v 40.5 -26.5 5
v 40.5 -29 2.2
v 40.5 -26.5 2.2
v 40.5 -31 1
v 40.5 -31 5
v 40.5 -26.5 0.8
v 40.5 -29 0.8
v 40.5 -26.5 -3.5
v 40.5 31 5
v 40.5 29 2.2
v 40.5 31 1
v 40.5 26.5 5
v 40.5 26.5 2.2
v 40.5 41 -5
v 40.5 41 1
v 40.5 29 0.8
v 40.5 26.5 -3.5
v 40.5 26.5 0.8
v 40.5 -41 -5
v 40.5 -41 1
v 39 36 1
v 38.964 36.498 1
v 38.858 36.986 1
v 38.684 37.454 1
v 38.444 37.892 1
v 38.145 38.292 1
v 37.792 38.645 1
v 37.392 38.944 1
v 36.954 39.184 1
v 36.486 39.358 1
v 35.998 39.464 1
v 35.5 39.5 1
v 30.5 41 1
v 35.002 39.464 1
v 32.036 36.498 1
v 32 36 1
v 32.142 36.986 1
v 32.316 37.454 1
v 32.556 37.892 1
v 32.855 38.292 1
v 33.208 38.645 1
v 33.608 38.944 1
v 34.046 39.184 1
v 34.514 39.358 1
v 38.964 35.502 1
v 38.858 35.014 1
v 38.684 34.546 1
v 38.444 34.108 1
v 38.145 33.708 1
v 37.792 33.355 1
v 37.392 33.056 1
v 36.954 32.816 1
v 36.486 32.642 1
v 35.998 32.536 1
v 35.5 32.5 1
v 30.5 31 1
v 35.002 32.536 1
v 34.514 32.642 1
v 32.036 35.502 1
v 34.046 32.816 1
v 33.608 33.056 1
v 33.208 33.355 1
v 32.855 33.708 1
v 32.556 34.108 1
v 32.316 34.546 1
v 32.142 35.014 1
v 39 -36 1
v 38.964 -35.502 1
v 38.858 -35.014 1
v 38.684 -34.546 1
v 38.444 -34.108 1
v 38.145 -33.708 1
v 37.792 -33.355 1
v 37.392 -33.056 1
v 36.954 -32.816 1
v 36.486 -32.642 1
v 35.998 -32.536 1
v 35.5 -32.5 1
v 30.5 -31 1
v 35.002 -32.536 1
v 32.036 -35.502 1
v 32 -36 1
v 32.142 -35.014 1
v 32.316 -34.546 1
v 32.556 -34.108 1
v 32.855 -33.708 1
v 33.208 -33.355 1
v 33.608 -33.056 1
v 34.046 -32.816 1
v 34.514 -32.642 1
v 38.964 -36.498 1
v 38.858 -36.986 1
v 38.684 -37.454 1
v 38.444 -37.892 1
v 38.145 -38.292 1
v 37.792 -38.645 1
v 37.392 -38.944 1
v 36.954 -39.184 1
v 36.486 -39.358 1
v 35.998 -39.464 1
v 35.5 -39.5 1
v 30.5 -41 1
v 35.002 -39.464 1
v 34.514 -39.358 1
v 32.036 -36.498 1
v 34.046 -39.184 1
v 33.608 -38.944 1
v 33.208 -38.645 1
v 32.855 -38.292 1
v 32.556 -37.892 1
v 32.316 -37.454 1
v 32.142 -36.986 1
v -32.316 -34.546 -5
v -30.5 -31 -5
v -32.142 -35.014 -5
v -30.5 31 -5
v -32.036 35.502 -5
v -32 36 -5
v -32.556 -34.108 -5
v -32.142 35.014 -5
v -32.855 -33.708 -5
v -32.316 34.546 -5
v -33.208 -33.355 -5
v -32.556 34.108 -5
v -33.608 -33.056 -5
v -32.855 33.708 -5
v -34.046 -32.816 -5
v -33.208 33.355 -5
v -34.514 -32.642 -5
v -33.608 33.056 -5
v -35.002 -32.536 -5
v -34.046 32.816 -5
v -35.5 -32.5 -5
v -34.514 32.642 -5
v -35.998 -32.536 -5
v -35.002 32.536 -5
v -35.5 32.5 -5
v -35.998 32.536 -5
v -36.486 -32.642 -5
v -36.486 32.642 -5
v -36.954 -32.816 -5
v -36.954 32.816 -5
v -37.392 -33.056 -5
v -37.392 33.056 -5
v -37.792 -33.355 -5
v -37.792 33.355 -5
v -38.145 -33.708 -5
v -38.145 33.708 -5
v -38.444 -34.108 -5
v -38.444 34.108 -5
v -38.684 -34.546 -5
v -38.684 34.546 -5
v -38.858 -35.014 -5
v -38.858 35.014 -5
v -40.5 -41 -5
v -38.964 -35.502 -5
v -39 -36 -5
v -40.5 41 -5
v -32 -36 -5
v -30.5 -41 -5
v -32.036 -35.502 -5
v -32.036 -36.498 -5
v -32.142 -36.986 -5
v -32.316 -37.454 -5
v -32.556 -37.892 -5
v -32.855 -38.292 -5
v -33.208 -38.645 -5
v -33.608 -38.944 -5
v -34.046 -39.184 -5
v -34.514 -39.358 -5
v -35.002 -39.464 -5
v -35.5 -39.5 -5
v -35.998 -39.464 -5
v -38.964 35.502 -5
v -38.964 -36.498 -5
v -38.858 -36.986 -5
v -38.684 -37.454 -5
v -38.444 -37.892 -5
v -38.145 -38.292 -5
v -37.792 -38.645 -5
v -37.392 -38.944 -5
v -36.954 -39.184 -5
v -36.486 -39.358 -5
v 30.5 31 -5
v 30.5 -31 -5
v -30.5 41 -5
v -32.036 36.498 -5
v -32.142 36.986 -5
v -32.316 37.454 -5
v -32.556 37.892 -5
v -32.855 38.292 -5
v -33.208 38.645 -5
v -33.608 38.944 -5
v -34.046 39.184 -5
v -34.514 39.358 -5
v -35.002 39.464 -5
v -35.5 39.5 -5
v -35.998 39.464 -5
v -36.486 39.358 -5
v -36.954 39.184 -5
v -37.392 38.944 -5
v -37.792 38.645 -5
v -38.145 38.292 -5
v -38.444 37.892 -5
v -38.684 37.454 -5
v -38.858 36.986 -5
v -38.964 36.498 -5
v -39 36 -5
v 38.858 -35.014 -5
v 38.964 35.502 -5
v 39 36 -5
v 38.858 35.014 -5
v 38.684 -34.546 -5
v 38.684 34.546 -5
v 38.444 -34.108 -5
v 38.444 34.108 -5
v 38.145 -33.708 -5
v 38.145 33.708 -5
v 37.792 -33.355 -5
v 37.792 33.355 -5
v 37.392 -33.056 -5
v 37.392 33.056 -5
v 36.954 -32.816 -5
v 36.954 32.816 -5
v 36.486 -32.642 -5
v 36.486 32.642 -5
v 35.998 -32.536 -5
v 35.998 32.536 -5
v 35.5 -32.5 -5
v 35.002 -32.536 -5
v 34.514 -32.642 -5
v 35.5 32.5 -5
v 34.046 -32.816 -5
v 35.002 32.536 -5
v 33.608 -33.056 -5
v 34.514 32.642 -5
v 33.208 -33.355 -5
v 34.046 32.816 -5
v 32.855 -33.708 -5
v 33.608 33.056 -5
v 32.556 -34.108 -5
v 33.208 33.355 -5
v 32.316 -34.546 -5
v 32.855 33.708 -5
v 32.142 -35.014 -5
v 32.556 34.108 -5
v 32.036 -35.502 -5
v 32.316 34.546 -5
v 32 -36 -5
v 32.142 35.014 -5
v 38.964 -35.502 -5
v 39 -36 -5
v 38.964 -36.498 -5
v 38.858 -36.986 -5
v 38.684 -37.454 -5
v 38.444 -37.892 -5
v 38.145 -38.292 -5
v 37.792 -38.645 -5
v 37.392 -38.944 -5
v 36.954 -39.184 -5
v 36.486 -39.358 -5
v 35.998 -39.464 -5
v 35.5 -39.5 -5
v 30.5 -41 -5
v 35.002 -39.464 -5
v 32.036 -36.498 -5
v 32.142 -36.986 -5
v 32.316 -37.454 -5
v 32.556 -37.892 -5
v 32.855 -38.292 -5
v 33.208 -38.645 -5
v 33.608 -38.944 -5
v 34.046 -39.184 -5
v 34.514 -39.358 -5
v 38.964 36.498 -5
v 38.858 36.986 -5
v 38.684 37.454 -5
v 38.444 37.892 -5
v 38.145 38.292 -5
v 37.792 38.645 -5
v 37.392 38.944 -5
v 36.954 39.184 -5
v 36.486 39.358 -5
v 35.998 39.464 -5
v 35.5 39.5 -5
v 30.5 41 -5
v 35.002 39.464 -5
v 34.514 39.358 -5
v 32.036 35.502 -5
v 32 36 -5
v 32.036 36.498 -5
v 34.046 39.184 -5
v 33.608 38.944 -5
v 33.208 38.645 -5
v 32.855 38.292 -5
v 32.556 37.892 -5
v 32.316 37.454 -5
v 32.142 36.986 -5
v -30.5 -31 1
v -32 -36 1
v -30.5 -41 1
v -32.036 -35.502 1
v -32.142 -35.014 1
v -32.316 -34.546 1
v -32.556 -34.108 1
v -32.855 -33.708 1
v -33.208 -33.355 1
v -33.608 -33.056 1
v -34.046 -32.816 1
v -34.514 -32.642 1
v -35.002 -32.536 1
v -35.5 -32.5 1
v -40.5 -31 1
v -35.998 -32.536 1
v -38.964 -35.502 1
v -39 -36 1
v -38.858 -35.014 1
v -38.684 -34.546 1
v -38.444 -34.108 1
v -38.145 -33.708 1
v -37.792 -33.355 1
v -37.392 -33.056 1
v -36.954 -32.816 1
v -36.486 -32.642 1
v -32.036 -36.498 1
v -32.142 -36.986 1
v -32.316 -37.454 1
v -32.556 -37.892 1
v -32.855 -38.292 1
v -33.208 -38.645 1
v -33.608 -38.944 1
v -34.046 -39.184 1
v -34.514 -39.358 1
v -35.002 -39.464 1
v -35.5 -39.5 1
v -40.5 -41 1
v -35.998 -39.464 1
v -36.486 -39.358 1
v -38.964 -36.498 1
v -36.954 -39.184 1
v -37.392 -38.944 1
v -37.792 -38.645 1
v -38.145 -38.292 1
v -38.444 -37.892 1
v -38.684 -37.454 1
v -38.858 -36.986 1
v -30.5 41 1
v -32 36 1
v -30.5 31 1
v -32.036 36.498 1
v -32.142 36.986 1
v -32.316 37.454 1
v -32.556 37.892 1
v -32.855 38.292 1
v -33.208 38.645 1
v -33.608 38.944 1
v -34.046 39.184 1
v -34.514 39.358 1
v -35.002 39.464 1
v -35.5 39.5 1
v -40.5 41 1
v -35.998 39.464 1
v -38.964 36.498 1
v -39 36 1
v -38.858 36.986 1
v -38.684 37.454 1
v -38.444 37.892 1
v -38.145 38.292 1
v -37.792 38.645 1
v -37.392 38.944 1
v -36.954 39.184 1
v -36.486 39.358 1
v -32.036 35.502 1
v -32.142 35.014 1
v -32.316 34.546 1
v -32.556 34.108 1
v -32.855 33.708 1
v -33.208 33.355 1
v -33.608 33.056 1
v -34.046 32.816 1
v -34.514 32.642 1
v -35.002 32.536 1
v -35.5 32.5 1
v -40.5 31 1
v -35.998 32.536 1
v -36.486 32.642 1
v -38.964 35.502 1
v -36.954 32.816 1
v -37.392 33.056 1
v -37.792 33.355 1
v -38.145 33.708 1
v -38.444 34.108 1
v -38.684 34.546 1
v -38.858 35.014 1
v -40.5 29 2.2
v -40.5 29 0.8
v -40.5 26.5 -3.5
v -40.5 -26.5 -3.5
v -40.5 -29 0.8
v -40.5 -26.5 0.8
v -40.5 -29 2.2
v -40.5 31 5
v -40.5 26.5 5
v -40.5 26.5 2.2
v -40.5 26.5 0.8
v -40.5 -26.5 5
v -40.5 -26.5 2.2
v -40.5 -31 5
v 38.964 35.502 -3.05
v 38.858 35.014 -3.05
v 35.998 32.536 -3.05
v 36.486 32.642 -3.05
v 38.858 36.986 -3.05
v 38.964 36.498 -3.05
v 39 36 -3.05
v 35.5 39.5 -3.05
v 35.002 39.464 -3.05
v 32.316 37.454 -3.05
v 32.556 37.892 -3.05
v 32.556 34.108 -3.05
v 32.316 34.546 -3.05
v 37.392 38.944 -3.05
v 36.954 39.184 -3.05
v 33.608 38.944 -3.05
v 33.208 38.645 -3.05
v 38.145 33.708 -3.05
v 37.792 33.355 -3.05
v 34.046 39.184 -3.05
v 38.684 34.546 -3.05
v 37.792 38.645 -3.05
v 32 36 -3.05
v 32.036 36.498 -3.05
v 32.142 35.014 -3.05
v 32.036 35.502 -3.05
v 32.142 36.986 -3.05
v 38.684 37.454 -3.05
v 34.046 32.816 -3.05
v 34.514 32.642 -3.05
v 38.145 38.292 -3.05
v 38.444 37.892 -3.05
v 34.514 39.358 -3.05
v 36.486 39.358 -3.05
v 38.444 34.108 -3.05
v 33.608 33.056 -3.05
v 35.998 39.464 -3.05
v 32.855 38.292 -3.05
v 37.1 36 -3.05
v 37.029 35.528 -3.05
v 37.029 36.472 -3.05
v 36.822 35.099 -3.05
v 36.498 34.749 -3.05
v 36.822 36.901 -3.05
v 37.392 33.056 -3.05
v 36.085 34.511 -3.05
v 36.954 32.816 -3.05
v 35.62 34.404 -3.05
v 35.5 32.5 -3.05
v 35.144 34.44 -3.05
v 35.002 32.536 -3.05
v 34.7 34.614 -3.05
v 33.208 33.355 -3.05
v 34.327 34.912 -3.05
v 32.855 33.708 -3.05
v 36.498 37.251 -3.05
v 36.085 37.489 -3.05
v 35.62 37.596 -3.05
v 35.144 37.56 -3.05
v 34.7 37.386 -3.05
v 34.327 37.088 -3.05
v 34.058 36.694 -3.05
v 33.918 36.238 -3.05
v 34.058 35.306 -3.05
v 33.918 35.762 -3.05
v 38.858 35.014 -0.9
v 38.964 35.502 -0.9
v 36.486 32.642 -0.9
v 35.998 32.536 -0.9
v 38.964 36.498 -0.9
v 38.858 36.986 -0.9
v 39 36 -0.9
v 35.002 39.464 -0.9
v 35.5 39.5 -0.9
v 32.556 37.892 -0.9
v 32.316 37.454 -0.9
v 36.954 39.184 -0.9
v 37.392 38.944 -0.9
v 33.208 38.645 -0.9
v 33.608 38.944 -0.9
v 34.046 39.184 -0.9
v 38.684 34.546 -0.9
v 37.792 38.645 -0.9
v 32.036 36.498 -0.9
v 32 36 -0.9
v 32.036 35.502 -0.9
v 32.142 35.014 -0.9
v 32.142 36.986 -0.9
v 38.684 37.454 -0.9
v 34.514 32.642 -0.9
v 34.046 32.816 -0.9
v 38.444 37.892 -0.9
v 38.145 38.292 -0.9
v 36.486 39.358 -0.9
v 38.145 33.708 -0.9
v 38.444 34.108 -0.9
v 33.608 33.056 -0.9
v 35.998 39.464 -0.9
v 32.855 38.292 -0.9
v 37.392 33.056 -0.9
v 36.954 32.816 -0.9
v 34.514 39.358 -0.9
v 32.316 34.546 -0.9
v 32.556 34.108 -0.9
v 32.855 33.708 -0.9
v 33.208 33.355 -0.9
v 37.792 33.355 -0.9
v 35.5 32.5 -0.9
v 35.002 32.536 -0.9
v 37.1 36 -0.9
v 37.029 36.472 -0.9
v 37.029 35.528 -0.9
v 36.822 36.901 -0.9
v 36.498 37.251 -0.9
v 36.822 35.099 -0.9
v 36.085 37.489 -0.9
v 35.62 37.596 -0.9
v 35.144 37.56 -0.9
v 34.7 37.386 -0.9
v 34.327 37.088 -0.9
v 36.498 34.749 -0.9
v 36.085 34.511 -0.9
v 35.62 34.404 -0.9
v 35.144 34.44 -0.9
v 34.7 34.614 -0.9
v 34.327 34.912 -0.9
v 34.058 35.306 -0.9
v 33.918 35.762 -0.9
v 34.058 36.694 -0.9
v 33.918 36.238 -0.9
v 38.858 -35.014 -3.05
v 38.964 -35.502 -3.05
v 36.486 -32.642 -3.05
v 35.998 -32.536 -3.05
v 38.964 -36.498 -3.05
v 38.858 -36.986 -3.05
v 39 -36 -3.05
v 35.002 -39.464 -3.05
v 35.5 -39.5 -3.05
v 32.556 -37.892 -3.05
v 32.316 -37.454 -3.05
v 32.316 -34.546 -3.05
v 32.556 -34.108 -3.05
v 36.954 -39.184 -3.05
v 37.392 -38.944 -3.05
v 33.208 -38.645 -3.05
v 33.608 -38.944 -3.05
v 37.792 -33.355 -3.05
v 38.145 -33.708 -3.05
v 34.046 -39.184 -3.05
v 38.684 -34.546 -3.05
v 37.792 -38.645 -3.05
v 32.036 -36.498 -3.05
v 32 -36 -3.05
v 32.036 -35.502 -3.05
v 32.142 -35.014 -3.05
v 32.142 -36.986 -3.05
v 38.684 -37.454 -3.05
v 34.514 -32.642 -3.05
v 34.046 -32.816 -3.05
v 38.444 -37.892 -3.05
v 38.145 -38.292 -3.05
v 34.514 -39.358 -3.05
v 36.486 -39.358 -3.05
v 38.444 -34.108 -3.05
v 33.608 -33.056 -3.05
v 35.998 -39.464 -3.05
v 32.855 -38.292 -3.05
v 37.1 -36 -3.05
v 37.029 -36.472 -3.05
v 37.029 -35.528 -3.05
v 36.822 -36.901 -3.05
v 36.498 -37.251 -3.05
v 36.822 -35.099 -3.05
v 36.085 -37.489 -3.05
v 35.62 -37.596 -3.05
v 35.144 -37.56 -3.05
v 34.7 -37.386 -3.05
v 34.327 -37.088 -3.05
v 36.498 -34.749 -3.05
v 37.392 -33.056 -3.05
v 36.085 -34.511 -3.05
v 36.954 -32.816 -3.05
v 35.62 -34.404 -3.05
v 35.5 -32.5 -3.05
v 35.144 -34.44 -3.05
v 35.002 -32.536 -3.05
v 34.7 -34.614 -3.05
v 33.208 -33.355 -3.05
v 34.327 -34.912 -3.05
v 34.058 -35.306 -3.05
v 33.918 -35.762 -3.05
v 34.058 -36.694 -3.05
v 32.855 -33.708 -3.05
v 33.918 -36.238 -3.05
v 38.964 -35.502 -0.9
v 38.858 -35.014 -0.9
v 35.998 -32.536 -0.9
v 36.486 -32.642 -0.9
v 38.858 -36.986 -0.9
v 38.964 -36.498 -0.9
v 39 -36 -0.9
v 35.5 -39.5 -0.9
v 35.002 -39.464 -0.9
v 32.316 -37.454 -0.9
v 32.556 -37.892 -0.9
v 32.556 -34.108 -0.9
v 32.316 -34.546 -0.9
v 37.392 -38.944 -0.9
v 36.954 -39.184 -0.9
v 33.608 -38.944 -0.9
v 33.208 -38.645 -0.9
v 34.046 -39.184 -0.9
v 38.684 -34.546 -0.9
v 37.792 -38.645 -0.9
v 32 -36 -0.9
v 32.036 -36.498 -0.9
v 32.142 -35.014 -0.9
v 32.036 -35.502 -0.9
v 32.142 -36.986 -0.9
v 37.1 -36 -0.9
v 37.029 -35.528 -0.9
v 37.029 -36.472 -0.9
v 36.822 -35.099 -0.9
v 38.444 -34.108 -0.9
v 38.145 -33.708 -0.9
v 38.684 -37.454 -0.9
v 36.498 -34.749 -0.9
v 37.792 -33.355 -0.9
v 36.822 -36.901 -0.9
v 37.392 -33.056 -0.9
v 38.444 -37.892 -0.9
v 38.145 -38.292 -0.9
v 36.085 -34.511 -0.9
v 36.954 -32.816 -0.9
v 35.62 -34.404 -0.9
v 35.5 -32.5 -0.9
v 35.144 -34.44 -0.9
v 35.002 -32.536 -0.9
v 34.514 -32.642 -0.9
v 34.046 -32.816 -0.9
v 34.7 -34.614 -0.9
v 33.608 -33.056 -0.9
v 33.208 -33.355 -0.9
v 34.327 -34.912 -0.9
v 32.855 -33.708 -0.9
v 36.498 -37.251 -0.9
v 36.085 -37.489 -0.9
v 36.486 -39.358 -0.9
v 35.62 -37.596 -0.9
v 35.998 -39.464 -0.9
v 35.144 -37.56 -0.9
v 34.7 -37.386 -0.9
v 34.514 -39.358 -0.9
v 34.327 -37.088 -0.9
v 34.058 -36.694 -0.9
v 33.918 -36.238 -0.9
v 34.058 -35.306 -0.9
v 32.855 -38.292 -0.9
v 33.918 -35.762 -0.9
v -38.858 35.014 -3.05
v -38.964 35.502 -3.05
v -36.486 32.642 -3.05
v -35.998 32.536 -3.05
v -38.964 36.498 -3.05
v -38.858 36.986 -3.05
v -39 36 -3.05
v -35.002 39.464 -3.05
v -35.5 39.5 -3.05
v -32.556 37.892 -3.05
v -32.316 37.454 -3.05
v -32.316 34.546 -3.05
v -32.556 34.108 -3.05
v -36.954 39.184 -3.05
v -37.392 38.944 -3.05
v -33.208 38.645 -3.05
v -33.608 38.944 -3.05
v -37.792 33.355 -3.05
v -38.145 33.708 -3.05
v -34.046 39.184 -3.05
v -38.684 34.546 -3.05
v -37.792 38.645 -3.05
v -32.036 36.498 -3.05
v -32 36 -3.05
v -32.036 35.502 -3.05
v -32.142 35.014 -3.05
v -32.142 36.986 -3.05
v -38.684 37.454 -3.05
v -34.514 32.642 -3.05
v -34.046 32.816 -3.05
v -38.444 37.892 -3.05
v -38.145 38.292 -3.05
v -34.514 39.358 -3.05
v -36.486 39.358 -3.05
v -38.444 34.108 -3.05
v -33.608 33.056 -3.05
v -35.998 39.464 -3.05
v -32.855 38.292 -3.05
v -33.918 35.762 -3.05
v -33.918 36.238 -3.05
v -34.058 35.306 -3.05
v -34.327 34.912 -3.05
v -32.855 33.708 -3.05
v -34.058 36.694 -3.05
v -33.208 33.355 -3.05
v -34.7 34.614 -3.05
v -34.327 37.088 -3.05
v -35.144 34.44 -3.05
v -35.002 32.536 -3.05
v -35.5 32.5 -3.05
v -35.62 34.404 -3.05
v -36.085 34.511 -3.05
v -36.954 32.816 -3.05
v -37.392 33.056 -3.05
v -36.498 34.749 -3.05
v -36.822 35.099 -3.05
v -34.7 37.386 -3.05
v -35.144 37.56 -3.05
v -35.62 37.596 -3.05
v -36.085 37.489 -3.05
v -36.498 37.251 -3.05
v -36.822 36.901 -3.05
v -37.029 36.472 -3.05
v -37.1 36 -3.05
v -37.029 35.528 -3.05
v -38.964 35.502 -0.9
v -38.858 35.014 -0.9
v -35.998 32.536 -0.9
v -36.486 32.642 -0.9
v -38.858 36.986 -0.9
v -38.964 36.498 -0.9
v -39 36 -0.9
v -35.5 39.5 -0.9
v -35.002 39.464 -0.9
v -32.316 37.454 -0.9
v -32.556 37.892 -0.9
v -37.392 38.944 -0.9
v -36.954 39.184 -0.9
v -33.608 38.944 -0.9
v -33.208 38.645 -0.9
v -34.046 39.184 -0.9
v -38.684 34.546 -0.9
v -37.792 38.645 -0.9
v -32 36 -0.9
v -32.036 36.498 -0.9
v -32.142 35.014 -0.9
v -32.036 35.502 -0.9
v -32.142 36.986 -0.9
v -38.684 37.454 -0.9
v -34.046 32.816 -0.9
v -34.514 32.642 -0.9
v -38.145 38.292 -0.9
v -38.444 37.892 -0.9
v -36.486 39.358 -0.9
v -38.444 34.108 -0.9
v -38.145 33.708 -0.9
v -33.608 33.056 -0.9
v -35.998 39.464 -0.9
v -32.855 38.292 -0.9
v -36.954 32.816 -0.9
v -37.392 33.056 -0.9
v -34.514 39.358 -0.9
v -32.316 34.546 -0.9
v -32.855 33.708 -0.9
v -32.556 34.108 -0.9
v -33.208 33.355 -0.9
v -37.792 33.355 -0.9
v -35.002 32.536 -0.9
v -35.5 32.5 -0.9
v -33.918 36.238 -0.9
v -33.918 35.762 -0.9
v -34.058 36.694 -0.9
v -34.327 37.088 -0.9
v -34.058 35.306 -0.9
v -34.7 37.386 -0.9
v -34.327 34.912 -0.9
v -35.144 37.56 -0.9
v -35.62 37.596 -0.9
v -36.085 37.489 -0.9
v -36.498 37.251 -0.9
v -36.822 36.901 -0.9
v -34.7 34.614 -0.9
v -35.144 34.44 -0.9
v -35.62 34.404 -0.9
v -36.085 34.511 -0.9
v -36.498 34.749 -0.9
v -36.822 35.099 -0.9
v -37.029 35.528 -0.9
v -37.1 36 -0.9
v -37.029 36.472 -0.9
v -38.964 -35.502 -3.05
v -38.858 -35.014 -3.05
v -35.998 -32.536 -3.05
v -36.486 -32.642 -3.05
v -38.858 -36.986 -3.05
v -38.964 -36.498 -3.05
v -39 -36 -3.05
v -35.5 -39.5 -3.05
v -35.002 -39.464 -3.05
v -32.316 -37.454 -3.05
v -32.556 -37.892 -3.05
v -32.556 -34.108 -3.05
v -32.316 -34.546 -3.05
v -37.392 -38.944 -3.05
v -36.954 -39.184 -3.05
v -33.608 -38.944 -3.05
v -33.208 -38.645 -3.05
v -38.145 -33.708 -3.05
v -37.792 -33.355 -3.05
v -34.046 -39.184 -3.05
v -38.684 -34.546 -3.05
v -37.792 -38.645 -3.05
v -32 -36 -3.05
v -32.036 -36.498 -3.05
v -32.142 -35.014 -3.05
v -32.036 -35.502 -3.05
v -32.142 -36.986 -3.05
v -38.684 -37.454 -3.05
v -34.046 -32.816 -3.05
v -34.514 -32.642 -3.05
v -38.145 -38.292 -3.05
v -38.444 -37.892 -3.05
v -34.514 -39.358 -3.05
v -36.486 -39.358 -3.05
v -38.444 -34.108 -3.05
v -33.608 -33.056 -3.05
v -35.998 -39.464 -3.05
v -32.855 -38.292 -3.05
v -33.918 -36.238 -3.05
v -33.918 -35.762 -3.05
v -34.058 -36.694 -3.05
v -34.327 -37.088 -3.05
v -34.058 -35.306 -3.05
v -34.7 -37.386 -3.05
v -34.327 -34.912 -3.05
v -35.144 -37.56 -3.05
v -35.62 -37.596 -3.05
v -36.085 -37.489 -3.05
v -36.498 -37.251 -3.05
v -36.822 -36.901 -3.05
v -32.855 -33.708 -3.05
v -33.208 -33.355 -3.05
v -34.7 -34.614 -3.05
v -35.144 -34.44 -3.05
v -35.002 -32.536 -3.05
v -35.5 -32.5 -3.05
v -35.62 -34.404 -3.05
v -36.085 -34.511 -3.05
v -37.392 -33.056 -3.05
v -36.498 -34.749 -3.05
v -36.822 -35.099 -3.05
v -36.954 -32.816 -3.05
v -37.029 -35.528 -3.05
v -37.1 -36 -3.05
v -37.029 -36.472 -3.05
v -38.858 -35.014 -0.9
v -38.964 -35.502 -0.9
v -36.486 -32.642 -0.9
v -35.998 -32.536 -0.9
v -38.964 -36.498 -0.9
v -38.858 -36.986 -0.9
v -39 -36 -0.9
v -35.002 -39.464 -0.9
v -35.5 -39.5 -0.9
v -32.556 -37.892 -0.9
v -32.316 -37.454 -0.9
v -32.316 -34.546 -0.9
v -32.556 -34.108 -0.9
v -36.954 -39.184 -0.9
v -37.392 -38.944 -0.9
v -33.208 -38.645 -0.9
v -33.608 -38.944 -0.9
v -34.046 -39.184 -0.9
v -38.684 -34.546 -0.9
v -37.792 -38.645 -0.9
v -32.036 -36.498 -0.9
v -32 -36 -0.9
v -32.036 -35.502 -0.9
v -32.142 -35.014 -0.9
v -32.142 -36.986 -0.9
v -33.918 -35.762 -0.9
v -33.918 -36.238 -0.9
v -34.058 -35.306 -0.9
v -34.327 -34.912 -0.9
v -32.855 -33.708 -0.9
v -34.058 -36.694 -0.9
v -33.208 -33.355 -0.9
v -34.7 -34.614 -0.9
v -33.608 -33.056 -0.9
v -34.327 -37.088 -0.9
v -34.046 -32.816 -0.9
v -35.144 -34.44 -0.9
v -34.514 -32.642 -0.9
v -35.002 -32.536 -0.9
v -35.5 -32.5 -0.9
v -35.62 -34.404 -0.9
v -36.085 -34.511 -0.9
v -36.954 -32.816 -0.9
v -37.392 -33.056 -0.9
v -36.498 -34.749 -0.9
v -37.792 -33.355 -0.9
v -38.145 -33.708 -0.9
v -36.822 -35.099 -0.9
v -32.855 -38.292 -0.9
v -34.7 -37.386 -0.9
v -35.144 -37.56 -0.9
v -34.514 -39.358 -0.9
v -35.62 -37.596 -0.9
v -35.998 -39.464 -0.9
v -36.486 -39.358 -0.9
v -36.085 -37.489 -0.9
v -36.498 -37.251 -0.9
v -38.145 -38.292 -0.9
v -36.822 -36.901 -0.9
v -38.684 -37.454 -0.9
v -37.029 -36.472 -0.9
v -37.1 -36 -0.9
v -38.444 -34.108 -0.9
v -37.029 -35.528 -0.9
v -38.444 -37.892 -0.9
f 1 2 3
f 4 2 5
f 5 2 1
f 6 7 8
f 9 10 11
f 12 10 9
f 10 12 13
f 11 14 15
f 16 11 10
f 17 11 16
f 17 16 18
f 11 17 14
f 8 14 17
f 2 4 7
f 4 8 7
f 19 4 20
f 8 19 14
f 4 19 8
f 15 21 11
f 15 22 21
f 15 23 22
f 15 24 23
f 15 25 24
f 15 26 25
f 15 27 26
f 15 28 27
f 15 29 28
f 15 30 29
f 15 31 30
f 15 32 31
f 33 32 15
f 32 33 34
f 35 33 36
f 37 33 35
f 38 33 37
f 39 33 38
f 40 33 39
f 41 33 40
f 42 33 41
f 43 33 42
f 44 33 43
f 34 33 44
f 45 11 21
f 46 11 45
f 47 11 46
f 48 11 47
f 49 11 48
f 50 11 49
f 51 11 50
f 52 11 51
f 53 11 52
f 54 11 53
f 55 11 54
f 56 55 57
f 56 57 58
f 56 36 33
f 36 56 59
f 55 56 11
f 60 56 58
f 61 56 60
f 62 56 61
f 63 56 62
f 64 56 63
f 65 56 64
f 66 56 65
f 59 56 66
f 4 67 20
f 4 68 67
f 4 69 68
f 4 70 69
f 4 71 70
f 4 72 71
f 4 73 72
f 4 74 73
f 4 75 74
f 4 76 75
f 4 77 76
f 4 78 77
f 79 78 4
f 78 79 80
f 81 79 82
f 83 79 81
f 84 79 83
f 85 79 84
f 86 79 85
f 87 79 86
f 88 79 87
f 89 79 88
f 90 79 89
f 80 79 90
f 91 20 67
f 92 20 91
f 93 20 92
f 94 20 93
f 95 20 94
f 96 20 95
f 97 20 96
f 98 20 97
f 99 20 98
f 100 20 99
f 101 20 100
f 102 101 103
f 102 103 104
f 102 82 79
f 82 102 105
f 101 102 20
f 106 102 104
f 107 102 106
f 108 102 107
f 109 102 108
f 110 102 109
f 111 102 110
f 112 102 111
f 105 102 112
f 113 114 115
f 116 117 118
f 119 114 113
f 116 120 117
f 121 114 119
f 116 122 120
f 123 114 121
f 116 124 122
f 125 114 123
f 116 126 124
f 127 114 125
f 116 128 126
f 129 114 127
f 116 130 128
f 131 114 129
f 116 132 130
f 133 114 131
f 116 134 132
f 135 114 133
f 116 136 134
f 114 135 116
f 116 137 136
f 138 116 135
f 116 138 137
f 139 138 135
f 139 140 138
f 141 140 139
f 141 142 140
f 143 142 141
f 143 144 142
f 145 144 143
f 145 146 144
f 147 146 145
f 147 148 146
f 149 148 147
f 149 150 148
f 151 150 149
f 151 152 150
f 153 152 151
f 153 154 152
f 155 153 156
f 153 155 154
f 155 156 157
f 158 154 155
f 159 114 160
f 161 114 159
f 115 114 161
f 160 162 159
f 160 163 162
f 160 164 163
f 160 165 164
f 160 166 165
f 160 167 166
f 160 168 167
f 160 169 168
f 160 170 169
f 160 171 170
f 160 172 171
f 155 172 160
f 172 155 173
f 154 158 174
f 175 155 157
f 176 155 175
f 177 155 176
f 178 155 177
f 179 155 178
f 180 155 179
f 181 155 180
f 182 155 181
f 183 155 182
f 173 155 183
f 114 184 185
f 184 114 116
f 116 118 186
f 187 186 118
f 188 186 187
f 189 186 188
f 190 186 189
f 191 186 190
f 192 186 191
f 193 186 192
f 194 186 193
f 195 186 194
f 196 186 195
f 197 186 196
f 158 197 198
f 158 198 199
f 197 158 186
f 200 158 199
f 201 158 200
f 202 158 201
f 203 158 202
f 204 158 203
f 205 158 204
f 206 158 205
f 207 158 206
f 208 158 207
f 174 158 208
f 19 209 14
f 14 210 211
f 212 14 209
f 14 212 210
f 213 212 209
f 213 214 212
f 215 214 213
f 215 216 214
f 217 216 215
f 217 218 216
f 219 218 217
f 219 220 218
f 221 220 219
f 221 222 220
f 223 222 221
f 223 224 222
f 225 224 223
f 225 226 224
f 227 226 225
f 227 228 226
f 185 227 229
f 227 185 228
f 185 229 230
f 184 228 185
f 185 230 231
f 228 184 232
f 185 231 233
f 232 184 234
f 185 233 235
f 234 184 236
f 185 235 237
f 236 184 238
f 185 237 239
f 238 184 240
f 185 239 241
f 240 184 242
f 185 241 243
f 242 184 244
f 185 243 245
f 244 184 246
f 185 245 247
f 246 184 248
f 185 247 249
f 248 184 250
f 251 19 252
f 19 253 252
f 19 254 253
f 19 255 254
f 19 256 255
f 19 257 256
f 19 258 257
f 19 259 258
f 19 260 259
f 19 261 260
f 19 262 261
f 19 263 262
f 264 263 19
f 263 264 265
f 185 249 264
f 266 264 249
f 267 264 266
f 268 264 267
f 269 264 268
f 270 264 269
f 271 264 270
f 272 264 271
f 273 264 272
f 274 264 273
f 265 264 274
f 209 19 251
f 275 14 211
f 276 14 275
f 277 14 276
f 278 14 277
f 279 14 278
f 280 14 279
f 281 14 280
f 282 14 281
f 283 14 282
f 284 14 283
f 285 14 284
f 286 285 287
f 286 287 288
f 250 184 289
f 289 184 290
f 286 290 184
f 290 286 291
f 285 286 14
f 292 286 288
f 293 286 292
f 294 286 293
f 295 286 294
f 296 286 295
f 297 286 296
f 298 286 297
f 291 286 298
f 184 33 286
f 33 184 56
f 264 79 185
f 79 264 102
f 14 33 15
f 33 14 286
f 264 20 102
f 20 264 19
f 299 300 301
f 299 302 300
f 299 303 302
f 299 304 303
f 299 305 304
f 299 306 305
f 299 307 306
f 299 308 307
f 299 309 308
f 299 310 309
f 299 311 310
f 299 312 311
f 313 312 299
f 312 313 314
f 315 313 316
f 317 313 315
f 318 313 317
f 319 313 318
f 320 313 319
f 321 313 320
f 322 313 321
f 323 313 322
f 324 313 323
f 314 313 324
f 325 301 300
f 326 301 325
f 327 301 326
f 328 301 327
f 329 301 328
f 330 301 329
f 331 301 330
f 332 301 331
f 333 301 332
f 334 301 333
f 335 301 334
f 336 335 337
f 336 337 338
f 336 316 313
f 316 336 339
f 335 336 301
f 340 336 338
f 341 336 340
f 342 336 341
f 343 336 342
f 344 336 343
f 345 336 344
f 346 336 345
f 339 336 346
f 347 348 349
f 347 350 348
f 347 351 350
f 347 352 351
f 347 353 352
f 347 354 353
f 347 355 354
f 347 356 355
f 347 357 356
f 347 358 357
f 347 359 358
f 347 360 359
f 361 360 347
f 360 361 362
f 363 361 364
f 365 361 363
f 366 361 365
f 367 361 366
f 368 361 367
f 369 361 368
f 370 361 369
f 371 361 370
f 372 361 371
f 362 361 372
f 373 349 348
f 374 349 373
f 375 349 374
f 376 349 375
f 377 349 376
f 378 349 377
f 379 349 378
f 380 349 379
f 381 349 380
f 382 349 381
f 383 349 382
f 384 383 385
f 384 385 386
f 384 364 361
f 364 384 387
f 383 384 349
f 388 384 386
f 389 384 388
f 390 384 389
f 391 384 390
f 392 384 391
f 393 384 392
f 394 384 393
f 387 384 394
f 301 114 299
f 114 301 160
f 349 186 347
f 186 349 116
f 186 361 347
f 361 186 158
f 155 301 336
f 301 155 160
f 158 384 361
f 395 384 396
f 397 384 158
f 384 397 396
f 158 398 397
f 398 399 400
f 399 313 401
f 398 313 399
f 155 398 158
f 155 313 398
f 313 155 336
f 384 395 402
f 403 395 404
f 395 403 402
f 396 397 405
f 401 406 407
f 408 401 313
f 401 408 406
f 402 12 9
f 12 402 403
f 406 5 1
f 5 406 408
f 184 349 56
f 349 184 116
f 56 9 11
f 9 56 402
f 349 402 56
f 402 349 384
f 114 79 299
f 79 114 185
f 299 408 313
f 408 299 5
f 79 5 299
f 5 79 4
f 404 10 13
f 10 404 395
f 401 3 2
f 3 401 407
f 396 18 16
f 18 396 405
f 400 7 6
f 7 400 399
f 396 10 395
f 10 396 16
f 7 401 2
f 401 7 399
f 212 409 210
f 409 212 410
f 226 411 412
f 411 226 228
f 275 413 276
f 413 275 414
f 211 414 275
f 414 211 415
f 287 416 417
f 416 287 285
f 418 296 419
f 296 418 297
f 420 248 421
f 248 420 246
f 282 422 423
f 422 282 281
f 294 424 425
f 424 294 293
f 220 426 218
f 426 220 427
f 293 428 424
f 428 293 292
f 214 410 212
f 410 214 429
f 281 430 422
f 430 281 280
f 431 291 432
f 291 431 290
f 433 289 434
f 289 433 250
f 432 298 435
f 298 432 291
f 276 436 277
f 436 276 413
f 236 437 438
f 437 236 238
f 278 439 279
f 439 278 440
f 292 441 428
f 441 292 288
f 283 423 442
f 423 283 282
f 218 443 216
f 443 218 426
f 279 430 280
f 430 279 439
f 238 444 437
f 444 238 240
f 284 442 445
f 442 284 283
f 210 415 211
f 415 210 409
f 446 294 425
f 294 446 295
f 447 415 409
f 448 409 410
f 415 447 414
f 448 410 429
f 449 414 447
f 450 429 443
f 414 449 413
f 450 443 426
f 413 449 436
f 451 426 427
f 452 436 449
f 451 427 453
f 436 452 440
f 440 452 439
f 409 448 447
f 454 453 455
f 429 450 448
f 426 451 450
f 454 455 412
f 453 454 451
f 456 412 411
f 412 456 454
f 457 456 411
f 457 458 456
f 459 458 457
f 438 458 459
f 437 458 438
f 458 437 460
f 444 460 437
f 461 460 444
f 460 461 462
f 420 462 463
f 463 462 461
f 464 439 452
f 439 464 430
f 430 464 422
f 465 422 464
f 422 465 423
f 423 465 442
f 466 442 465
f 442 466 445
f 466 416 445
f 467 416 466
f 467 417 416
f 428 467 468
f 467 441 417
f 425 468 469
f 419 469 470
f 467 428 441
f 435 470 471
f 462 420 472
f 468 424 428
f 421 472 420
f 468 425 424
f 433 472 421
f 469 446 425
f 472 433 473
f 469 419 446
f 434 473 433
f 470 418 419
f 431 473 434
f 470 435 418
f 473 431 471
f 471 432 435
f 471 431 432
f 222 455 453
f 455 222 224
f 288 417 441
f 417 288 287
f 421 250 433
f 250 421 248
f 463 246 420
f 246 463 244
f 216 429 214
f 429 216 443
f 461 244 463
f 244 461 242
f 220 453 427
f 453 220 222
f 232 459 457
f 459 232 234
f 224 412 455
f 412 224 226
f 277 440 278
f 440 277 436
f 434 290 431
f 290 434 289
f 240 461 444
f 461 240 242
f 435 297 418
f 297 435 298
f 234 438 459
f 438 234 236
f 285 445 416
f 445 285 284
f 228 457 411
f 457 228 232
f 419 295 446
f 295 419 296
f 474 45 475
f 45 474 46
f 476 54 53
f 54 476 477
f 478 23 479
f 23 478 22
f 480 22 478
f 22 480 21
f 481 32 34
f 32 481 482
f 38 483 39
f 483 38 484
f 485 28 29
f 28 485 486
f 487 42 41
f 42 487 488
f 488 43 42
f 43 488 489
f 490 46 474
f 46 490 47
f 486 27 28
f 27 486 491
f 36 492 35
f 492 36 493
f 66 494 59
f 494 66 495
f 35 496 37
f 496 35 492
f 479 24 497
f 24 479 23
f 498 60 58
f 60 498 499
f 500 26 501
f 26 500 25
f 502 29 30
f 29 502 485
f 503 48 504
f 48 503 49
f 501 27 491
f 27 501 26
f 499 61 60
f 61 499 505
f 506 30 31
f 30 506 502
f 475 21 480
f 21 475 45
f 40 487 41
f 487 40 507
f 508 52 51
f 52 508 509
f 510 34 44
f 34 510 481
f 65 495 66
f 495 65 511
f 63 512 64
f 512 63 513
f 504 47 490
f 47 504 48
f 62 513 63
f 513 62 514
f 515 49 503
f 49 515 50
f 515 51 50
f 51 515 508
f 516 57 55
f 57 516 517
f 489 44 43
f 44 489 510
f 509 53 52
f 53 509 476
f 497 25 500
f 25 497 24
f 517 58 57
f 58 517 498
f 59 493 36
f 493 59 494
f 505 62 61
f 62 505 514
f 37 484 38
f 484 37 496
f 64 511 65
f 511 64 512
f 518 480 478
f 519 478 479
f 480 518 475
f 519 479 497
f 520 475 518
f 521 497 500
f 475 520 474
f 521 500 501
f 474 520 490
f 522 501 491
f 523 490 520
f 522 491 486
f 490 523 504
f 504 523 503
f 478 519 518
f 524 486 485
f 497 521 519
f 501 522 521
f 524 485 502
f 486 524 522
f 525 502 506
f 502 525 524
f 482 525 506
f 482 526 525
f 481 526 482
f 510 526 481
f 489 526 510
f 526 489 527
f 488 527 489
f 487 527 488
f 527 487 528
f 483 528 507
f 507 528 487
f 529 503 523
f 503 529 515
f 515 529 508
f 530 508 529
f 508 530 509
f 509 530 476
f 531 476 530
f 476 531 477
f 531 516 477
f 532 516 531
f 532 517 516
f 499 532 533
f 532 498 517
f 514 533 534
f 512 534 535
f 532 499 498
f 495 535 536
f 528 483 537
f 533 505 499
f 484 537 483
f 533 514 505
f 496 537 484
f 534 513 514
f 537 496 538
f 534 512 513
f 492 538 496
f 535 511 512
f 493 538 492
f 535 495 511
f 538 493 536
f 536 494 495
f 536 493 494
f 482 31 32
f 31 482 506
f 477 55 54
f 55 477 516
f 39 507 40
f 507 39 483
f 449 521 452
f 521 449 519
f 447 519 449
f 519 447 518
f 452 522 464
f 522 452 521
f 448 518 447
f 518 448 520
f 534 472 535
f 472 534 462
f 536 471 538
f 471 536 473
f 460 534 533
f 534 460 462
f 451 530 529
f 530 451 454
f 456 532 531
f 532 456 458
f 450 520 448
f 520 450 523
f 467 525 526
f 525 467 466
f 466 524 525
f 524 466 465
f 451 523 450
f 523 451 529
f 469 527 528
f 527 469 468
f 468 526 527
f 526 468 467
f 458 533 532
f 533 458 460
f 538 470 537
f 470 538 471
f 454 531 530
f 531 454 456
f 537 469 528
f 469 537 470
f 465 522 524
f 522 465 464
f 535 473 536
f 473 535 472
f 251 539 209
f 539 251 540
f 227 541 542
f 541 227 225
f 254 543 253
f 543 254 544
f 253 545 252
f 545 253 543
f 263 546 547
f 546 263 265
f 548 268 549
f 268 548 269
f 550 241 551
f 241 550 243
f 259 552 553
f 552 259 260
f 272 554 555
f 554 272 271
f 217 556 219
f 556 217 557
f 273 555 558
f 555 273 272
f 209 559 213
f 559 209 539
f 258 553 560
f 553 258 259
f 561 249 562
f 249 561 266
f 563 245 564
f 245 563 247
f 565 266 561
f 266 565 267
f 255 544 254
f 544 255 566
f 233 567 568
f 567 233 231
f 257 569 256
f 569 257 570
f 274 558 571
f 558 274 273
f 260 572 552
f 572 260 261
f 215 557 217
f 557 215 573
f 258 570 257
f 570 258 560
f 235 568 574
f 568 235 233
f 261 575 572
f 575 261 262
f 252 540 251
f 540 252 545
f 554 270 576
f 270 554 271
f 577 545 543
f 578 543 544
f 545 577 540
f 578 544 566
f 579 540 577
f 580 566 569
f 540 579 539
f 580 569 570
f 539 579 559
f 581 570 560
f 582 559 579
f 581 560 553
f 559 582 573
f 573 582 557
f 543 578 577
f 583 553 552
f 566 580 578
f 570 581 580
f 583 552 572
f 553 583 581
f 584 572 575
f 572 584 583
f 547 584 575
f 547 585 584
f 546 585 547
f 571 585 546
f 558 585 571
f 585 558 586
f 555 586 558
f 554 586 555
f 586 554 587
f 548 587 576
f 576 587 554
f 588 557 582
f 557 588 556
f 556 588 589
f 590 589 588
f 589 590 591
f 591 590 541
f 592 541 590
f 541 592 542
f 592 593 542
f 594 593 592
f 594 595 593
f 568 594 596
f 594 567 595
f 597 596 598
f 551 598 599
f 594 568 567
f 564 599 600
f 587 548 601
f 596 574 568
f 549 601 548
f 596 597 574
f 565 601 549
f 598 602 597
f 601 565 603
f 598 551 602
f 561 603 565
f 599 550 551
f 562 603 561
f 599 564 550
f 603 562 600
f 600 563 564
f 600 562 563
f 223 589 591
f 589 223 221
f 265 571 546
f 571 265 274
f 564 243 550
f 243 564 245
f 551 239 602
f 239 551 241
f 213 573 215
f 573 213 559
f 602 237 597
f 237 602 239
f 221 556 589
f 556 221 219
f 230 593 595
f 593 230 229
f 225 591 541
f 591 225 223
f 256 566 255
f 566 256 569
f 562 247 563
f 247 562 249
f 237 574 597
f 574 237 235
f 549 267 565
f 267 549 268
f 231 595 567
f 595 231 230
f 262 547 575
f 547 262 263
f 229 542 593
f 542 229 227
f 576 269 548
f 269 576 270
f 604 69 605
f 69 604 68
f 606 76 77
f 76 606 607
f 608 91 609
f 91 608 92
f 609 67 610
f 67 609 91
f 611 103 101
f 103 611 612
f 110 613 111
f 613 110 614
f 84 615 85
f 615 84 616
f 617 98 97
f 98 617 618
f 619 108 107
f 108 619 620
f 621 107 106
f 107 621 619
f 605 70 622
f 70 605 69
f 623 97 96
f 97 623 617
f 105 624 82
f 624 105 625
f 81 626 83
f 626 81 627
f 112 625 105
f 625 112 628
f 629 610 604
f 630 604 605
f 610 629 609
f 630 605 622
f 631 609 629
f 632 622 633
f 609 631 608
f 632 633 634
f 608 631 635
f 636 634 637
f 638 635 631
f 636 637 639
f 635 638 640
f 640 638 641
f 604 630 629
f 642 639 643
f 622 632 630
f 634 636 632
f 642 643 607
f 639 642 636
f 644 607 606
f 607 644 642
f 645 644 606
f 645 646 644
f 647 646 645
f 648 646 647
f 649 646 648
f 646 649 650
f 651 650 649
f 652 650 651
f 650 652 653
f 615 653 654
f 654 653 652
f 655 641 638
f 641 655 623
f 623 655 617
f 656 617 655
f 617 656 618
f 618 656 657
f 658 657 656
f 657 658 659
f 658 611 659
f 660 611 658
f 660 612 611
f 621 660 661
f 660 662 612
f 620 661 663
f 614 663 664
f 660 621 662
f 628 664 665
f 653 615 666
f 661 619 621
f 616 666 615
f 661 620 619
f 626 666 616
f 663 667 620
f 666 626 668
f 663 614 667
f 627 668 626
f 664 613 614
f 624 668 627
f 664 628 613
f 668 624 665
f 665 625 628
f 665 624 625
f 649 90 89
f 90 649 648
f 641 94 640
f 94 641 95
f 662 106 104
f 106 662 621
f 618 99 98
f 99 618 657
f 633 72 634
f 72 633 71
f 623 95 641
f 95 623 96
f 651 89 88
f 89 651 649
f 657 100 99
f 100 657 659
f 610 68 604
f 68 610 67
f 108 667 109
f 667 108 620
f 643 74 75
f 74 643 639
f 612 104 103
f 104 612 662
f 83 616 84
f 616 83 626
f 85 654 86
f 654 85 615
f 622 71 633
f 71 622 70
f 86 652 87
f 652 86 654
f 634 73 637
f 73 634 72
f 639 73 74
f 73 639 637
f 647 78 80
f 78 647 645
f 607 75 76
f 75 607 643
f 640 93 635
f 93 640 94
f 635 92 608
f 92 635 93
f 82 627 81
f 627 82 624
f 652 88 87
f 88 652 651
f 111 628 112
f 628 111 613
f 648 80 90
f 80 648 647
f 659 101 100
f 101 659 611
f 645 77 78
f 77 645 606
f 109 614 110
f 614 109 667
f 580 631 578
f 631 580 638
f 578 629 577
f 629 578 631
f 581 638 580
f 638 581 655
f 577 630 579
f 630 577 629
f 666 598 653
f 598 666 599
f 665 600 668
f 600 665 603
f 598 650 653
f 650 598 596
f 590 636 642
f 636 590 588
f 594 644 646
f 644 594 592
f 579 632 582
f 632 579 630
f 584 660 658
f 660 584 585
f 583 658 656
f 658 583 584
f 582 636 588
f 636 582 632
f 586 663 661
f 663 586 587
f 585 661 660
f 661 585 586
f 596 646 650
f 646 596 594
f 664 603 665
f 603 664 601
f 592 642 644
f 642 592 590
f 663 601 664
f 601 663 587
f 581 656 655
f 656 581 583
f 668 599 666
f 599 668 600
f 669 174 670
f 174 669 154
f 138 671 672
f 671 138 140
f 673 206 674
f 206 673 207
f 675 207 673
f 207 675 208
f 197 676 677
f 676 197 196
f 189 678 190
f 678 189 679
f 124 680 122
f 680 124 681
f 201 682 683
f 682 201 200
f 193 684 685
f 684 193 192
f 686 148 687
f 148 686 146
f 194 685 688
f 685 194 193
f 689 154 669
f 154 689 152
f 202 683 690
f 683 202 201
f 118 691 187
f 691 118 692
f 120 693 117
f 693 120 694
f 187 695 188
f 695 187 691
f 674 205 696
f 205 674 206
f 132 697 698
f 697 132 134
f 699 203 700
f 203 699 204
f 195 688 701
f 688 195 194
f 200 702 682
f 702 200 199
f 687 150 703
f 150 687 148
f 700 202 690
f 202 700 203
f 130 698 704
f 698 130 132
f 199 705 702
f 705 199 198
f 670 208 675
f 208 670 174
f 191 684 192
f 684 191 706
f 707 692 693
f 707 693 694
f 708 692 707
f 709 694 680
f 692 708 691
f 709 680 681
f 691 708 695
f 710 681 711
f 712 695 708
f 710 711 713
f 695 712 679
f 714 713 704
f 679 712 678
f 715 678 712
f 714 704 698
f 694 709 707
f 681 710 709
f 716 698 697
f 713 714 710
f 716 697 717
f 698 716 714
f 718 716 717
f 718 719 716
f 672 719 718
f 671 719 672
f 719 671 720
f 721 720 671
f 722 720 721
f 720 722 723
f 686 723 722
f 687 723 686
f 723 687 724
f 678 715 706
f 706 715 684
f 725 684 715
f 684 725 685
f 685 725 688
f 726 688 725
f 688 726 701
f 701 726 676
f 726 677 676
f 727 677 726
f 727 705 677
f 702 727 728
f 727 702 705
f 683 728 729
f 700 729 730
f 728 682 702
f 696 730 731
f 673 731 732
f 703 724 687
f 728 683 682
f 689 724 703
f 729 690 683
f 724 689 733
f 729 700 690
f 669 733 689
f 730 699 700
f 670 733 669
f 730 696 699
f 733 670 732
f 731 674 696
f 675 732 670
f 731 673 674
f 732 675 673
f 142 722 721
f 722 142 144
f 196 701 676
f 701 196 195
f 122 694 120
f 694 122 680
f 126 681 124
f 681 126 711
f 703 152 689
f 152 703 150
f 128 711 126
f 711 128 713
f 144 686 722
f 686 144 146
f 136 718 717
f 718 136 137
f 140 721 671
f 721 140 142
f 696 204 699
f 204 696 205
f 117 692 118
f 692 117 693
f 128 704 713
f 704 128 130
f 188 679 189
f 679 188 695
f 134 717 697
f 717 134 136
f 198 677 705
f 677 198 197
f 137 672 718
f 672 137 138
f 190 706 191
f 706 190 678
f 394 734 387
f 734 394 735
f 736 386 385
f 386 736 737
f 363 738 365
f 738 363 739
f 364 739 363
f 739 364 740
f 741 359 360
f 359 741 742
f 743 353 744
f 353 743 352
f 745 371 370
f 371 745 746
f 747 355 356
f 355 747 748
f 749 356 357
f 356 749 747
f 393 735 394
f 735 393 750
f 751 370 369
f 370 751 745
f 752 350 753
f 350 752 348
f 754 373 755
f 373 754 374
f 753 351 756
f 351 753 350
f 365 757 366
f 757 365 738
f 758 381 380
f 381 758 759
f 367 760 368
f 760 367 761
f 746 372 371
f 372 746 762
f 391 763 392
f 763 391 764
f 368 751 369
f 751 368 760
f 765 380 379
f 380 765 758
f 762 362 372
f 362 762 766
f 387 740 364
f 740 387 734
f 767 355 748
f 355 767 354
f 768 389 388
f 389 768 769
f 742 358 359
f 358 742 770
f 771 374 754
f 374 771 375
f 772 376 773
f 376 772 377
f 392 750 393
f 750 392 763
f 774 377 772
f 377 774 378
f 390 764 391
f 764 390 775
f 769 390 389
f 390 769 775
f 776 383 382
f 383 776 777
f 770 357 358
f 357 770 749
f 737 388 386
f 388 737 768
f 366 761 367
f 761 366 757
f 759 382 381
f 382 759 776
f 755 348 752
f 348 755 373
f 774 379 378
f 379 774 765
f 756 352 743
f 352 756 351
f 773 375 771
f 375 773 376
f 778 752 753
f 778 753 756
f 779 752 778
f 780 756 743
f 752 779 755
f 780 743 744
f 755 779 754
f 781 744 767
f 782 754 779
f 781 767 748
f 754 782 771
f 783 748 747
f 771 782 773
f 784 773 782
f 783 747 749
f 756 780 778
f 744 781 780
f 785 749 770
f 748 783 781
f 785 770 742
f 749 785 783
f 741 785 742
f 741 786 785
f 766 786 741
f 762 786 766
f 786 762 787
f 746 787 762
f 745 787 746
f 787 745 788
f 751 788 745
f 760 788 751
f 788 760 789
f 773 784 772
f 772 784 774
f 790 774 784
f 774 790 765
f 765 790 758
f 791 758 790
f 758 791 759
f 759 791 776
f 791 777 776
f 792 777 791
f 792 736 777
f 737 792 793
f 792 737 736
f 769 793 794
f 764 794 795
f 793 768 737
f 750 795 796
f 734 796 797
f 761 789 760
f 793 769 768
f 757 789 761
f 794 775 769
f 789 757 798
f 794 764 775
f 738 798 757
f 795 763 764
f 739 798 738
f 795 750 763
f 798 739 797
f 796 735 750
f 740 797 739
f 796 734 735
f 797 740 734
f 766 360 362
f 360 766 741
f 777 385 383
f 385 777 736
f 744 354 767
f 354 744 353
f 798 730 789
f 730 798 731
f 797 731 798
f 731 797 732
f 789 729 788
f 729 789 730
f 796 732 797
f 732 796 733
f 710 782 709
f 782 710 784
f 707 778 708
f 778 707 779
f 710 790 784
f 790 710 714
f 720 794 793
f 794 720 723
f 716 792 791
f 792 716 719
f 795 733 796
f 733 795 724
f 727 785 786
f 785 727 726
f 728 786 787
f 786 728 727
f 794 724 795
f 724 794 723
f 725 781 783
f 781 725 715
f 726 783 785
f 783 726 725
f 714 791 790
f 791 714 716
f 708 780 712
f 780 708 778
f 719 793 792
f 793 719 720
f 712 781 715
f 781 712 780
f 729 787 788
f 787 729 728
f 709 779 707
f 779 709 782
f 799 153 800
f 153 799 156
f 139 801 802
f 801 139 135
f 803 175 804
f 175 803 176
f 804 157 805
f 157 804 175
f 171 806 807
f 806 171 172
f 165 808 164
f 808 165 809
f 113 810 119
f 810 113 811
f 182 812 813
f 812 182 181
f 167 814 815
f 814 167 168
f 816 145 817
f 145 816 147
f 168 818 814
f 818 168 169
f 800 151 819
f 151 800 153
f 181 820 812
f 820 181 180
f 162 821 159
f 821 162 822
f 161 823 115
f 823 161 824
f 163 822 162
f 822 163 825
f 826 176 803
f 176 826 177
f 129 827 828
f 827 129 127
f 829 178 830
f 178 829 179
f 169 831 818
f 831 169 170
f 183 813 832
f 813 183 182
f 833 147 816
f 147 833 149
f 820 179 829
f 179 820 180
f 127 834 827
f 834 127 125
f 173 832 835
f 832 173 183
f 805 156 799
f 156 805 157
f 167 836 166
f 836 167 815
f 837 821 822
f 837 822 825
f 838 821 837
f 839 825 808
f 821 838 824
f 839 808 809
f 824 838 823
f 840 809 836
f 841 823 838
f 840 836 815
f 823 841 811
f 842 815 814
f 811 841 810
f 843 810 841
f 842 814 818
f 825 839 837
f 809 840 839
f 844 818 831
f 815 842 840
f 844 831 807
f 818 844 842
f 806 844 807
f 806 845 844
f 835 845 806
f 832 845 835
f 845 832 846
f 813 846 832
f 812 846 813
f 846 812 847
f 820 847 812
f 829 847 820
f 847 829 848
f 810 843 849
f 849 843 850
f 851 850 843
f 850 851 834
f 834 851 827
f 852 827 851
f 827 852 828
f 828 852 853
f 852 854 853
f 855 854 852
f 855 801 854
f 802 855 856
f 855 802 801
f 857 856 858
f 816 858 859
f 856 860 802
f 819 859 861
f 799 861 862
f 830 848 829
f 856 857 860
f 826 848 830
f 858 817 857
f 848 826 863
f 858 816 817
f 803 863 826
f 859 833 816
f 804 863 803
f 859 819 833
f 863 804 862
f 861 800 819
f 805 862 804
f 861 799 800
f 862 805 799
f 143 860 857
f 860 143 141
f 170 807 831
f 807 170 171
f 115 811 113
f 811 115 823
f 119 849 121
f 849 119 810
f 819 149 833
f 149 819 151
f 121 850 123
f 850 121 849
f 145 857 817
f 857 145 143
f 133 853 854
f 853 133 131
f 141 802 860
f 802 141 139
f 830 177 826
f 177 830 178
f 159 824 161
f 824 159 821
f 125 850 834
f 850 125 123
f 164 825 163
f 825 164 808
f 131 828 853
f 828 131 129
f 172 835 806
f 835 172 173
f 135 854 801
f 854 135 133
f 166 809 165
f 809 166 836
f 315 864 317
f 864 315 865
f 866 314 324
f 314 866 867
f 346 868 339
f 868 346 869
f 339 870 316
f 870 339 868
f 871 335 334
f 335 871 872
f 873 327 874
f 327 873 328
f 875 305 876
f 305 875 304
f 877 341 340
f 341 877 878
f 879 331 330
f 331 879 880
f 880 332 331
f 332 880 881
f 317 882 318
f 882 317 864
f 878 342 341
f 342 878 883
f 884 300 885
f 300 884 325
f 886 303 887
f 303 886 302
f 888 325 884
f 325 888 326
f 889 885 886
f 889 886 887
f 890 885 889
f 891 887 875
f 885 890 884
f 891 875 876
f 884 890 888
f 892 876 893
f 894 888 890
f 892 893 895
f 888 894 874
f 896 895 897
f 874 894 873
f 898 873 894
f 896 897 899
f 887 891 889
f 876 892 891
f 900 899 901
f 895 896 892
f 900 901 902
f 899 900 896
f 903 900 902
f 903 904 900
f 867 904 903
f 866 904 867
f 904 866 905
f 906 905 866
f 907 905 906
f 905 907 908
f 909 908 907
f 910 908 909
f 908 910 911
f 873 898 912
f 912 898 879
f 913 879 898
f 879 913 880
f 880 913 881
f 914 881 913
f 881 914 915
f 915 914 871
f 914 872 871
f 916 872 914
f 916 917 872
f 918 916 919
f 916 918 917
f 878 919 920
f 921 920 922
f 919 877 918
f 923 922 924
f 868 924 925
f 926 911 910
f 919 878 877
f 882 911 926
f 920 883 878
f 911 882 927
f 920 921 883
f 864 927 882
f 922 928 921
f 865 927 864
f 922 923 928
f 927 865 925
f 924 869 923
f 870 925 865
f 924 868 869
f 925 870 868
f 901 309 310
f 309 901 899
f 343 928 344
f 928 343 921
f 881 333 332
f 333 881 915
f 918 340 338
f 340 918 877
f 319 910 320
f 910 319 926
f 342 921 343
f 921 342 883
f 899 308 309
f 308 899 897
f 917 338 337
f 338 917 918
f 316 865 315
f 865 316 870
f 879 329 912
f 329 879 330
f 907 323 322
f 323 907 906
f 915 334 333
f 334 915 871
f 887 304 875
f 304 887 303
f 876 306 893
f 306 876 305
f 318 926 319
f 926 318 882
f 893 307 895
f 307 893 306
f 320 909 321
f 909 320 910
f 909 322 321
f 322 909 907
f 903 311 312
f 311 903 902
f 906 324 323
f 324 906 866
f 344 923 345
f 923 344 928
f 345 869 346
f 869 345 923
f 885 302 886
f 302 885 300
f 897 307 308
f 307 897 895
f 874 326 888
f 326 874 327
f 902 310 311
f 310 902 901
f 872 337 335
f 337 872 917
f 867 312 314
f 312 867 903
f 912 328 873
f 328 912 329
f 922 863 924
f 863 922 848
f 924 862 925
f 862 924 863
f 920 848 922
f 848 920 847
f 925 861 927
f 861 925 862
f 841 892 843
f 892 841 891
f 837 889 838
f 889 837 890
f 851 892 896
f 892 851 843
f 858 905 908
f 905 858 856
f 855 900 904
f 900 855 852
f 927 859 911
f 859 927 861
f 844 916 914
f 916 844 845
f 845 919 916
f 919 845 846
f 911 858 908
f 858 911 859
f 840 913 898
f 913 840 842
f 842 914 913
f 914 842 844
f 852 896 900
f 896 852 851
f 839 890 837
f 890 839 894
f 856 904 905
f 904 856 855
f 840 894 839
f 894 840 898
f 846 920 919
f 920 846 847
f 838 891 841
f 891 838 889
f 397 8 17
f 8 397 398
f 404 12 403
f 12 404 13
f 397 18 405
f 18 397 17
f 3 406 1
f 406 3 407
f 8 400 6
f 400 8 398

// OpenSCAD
// ****************  *************
// 

$fa=0.5; // default minimum facet angle
$fs=0.5; // default minimum facet size

// ==== big circuit
l1 = 81; // length 
w1 = 57; // width

// ==== small
//l1 = 20; // length 
//w1 = 41; // width

// ==== board paramters
h1 = 1; // height of the board
dw1 = 0.5; // delta to accomodate
dh1 = 0.2; // delta to accomodate
d2h1 = 4; // distance from the floor


// ======== container
l2 = l1; // length 
w2 = w1+5; // width
h2 = 10; // height

l3 = l1;
w3 = w1-4;
h3 = 8; 

w4 = 10; // for screwing stuff
h4 = 6; // 


difference(){
	// body
	union(){
	    cube([l2,w2,h2],center=true);
	    // body for screwing
	    for (a = [0,90]){
		mirror([a,0,0]){
		    translate([(l2-w4)/2,0,-(h2-h4)/2])
		    cube([w4,w2+2*w4,h4],center=true);
		}
	    }
	}
	// open space
	translate([0,0,(h2-h3)/2])
	cube([l3+1,w3,h3+1],center=true);
	
	// space for the board
	translate([0,0,-(h3+h1)/2-(h3-h2)+d2h1]){
	    cube([l1,w1+2*dw1,h1+2*dh1],center=true);
	    // actual board
	    #cube([l1,w1,h1],center=true);
	}
	for (a=[0,90]){
	    for (b=[0,90]){
		mirror([a,0,0])
		mirror([0,b,0]){
		    translate([(l2-w4)/2,(w2+w4)/2,-(h2-h4/3)/2-0.1])
		    cylinder(h=h4/3+0.1,r=3.5,center=true); 
		    translate([(l2-w4)/2,(w2+w4)/2,h4-(h2+h4/4)/2-0.1])
		    cylinder(h=h4/3+0.1,r=3.5,center=true); 
		    translate([(l2-w4)/2,(w2+w4)/2,-h2/2])
		    cylinder(h=2*h2,r=1.6,center=true); 
		}
	    }
	}
    }


*for (a=[0,90]){
    mirror([a,0,0])
    translate([l2/2+w4,0,0])
    cover();
}

*for (a=[0,90]){
    for (b=[0,90]){
	mirror([a,0,0])
	mirror([0,b,0]){
	    translate([l2/2+w4/4,w2/2+1.8*w4,0])
	    rotate([0,0,90])
	    MakeConnect();
	}
    }
}

module cover(){
    difference(){
	// body
	union(){
	    translate([-(w4-(h2-h3))/2,0,0])
	    cube([h2-h3,w2,h2],center=true);
	    
	    translate([0,0,-(h2-h4)/2])
	    cube([w4,w2+2*w4,h4],center=true);
	    
	}
	for (b=[0,90]){
	    mirror([0,b,0]){
		translate([0,(w2+w4)/2,-(h2-h4/3)/2-0.1])
		cylinder(h=h4/3+0.1,r=3.5,center=true); 
		translate([0,(w2+w4)/2,h4-(h2+h4/4)/2-0.1])
		cylinder(h=h4/3+0.1,r=3.5,center=true); 
		translate([0,(w2+w4)/2,-h2/2])
		cylinder(h=2*h2,r=1.6,center=true); 
	    }
	}
    }
}


module MakeConnect(){
    difference(){
	// base
	translate([0,0,-3*(h2-h4)/4])
	cube([w4,2*w4,h2-h4],center=true);
	for (b=[0,90]){
	    mirror([0,b,0]){
		translate([0,(w4)/2,-h2/2])
		cylinder(h=2*h2,r=1.6,center=true); 
		
		translate([0,(w4)/2,-3*(h2-h4)/4+(h2-h4)/4])
		cylinder(h=(h2-h4)/2+0.1,r=3.5,center=true); 
	    }
	}
    }
}
